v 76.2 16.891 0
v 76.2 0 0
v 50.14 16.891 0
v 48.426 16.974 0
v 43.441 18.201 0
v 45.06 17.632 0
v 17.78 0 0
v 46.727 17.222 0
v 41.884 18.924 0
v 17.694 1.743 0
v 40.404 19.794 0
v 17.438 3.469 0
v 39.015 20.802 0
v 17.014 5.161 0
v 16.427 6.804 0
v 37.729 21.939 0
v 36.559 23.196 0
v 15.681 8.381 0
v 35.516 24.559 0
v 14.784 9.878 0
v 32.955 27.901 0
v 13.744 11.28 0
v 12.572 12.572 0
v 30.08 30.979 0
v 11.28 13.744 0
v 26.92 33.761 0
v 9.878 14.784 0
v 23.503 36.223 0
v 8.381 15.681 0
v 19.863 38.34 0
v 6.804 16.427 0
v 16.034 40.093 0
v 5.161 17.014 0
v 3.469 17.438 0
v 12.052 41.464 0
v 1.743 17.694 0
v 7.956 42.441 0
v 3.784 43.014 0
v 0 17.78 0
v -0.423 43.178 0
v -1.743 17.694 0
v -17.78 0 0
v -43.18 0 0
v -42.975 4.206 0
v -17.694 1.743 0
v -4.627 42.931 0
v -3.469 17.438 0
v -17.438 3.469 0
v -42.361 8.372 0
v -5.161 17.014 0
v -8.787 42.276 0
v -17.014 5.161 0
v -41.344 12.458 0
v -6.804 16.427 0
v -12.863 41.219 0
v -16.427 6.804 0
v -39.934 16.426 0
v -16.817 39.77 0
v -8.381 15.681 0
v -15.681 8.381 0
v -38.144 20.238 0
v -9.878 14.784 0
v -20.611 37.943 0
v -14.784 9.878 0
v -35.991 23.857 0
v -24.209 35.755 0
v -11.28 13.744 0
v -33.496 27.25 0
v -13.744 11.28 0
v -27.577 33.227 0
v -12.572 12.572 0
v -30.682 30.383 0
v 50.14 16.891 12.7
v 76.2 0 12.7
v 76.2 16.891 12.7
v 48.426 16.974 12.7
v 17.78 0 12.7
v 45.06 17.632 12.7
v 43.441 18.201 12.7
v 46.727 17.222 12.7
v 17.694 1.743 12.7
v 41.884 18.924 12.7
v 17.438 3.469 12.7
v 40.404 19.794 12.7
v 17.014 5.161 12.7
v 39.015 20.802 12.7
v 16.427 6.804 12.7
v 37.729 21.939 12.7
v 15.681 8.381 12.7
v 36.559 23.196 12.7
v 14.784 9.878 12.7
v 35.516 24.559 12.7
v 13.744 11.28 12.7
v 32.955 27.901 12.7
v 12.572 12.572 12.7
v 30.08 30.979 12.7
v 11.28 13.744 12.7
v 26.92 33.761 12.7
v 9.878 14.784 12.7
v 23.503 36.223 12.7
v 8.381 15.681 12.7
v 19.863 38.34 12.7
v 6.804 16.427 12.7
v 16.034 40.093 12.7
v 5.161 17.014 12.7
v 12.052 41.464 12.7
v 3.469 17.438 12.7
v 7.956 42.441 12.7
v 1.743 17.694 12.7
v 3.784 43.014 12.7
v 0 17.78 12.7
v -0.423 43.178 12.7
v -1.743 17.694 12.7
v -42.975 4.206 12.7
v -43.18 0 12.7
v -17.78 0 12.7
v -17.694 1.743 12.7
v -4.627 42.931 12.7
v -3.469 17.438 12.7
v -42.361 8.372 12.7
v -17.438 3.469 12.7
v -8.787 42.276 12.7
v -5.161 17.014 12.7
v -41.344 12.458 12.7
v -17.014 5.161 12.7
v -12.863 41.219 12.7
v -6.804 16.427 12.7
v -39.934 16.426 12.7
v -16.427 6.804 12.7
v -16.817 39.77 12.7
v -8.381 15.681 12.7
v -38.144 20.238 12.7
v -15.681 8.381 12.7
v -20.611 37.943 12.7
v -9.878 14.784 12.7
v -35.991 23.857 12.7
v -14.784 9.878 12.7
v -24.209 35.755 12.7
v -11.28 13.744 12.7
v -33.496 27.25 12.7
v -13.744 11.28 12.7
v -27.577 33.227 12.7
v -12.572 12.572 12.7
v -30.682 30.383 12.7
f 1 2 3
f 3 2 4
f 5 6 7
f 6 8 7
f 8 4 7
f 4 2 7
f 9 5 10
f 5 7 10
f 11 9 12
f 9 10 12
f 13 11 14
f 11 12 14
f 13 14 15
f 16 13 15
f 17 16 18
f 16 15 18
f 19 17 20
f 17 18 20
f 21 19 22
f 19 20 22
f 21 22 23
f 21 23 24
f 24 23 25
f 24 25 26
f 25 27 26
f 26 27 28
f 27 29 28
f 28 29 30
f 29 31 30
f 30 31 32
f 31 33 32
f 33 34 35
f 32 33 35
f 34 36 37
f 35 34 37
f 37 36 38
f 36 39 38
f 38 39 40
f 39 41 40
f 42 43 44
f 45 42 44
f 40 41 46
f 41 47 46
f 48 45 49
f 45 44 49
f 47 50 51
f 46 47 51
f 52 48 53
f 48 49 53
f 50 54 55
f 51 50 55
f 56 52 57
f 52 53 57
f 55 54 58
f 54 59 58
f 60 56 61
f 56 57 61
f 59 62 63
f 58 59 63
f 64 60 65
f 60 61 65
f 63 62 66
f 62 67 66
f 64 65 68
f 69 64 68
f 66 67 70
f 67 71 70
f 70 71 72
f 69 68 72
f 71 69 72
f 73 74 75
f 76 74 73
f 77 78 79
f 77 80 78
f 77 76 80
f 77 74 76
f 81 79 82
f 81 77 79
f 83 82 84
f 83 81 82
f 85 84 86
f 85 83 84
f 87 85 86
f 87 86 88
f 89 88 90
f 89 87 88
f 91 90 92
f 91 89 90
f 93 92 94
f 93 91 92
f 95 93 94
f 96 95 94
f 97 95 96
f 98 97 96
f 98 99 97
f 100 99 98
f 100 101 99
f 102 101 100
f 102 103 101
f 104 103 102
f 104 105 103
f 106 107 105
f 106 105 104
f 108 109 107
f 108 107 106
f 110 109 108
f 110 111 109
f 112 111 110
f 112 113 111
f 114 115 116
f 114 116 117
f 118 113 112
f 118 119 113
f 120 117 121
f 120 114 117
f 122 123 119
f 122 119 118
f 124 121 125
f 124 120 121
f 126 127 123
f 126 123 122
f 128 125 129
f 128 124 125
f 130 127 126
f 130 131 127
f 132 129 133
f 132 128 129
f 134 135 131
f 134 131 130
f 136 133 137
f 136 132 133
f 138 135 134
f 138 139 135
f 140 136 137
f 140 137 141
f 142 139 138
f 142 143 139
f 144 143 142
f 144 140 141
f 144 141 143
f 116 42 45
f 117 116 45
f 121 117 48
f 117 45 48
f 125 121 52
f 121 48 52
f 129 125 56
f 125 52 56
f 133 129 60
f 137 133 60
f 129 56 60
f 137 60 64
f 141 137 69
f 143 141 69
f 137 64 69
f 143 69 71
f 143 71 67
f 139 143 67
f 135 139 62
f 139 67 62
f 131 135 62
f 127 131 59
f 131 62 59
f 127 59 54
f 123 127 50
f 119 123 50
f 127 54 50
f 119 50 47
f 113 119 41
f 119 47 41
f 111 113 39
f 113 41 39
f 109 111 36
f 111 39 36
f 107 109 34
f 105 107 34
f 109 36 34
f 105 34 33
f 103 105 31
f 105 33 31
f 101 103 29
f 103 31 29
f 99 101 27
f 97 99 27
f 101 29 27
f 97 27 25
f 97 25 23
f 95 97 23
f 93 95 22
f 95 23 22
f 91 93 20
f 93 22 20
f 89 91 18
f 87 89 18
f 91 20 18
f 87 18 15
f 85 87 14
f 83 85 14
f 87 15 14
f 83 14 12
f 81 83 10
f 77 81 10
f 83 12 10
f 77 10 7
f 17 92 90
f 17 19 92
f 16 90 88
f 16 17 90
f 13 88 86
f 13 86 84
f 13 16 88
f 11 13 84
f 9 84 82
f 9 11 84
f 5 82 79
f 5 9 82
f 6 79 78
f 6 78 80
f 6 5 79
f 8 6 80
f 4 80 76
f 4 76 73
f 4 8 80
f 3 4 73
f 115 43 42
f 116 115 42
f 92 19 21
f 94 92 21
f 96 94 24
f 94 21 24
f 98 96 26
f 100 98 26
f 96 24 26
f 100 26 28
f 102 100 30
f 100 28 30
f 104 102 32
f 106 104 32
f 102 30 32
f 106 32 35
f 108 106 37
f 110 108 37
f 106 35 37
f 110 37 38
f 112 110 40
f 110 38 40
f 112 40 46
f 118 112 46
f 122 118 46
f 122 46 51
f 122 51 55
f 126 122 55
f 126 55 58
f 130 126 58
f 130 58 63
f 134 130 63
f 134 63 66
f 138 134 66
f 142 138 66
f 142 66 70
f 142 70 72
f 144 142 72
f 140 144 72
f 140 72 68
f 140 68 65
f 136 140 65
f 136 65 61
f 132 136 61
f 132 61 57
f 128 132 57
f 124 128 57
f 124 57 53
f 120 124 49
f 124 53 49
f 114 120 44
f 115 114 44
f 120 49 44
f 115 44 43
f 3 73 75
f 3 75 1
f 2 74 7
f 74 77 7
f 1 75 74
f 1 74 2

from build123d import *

# Parameters (mm, degrees)
BASE_EXTRUDE_DEPTH  = 12.7
BOSS_EXTRUDE2_START = -11.060769
SKETCH2_W           = 12.7
SKETCH2_H           = 16.891
BOSS_EXTRUDE2_DEPTH = 11.060769
SKETCH3_W           = 12.7
SKETCH3_H           = 16.891
BOSS_EXTRUDE3_DEPTH = 25.4
FILLET1_R           = 17.78


with BuildPart() as part:
    # Sketch1 → Base-Extrude (new body)
    with BuildSketch(Plane.XY):
        with BuildLine():
            Line((-43.18, 0), (-17.78, 0))
            ThreePointArc((-17.78, 0), (0, 17.78), (17.78, 0))
            Line((17.78, 0), (43.18, 0))
            ThreePointArc((43.18, 0), (0, 43.18), (-43.18, 0))
        make_face()
    extrude(amount=BASE_EXTRUDE_DEPTH)

    # Sketch2 → Boss-Extrude2 (add)
    with BuildSketch(Plane(origin=(50.8, 0, 0), x_dir=(0, 0, -1), z_dir=(1, 0, 0)).offset(BOSS_EXTRUDE2_START)):
        with Locations((-6.35, 8.4455)):
            Rectangle(SKETCH2_W, SKETCH2_H)
    extrude(amount=BOSS_EXTRUDE2_DEPTH)

    # Sketch3 → Boss-Extrude3 (add)
    with BuildSketch(Plane(origin=(50.8, 0, 0), x_dir=(0, 0, -1), z_dir=(1, 0, 0))):
        with Locations((-6.35, 8.4455)):
            Rectangle(SKETCH3_W, SKETCH3_H)
    extrude(amount=BOSS_EXTRUDE3_DEPTH)

    # Fillet1
    fillet1_edges = [part.edges().sort_by_distance(p)[0] for p in [
        (39.739231, 16.891, 6.35),
    ]]
    fillet(fillet1_edges, radius=FILLET1_R)


solid = part.part
